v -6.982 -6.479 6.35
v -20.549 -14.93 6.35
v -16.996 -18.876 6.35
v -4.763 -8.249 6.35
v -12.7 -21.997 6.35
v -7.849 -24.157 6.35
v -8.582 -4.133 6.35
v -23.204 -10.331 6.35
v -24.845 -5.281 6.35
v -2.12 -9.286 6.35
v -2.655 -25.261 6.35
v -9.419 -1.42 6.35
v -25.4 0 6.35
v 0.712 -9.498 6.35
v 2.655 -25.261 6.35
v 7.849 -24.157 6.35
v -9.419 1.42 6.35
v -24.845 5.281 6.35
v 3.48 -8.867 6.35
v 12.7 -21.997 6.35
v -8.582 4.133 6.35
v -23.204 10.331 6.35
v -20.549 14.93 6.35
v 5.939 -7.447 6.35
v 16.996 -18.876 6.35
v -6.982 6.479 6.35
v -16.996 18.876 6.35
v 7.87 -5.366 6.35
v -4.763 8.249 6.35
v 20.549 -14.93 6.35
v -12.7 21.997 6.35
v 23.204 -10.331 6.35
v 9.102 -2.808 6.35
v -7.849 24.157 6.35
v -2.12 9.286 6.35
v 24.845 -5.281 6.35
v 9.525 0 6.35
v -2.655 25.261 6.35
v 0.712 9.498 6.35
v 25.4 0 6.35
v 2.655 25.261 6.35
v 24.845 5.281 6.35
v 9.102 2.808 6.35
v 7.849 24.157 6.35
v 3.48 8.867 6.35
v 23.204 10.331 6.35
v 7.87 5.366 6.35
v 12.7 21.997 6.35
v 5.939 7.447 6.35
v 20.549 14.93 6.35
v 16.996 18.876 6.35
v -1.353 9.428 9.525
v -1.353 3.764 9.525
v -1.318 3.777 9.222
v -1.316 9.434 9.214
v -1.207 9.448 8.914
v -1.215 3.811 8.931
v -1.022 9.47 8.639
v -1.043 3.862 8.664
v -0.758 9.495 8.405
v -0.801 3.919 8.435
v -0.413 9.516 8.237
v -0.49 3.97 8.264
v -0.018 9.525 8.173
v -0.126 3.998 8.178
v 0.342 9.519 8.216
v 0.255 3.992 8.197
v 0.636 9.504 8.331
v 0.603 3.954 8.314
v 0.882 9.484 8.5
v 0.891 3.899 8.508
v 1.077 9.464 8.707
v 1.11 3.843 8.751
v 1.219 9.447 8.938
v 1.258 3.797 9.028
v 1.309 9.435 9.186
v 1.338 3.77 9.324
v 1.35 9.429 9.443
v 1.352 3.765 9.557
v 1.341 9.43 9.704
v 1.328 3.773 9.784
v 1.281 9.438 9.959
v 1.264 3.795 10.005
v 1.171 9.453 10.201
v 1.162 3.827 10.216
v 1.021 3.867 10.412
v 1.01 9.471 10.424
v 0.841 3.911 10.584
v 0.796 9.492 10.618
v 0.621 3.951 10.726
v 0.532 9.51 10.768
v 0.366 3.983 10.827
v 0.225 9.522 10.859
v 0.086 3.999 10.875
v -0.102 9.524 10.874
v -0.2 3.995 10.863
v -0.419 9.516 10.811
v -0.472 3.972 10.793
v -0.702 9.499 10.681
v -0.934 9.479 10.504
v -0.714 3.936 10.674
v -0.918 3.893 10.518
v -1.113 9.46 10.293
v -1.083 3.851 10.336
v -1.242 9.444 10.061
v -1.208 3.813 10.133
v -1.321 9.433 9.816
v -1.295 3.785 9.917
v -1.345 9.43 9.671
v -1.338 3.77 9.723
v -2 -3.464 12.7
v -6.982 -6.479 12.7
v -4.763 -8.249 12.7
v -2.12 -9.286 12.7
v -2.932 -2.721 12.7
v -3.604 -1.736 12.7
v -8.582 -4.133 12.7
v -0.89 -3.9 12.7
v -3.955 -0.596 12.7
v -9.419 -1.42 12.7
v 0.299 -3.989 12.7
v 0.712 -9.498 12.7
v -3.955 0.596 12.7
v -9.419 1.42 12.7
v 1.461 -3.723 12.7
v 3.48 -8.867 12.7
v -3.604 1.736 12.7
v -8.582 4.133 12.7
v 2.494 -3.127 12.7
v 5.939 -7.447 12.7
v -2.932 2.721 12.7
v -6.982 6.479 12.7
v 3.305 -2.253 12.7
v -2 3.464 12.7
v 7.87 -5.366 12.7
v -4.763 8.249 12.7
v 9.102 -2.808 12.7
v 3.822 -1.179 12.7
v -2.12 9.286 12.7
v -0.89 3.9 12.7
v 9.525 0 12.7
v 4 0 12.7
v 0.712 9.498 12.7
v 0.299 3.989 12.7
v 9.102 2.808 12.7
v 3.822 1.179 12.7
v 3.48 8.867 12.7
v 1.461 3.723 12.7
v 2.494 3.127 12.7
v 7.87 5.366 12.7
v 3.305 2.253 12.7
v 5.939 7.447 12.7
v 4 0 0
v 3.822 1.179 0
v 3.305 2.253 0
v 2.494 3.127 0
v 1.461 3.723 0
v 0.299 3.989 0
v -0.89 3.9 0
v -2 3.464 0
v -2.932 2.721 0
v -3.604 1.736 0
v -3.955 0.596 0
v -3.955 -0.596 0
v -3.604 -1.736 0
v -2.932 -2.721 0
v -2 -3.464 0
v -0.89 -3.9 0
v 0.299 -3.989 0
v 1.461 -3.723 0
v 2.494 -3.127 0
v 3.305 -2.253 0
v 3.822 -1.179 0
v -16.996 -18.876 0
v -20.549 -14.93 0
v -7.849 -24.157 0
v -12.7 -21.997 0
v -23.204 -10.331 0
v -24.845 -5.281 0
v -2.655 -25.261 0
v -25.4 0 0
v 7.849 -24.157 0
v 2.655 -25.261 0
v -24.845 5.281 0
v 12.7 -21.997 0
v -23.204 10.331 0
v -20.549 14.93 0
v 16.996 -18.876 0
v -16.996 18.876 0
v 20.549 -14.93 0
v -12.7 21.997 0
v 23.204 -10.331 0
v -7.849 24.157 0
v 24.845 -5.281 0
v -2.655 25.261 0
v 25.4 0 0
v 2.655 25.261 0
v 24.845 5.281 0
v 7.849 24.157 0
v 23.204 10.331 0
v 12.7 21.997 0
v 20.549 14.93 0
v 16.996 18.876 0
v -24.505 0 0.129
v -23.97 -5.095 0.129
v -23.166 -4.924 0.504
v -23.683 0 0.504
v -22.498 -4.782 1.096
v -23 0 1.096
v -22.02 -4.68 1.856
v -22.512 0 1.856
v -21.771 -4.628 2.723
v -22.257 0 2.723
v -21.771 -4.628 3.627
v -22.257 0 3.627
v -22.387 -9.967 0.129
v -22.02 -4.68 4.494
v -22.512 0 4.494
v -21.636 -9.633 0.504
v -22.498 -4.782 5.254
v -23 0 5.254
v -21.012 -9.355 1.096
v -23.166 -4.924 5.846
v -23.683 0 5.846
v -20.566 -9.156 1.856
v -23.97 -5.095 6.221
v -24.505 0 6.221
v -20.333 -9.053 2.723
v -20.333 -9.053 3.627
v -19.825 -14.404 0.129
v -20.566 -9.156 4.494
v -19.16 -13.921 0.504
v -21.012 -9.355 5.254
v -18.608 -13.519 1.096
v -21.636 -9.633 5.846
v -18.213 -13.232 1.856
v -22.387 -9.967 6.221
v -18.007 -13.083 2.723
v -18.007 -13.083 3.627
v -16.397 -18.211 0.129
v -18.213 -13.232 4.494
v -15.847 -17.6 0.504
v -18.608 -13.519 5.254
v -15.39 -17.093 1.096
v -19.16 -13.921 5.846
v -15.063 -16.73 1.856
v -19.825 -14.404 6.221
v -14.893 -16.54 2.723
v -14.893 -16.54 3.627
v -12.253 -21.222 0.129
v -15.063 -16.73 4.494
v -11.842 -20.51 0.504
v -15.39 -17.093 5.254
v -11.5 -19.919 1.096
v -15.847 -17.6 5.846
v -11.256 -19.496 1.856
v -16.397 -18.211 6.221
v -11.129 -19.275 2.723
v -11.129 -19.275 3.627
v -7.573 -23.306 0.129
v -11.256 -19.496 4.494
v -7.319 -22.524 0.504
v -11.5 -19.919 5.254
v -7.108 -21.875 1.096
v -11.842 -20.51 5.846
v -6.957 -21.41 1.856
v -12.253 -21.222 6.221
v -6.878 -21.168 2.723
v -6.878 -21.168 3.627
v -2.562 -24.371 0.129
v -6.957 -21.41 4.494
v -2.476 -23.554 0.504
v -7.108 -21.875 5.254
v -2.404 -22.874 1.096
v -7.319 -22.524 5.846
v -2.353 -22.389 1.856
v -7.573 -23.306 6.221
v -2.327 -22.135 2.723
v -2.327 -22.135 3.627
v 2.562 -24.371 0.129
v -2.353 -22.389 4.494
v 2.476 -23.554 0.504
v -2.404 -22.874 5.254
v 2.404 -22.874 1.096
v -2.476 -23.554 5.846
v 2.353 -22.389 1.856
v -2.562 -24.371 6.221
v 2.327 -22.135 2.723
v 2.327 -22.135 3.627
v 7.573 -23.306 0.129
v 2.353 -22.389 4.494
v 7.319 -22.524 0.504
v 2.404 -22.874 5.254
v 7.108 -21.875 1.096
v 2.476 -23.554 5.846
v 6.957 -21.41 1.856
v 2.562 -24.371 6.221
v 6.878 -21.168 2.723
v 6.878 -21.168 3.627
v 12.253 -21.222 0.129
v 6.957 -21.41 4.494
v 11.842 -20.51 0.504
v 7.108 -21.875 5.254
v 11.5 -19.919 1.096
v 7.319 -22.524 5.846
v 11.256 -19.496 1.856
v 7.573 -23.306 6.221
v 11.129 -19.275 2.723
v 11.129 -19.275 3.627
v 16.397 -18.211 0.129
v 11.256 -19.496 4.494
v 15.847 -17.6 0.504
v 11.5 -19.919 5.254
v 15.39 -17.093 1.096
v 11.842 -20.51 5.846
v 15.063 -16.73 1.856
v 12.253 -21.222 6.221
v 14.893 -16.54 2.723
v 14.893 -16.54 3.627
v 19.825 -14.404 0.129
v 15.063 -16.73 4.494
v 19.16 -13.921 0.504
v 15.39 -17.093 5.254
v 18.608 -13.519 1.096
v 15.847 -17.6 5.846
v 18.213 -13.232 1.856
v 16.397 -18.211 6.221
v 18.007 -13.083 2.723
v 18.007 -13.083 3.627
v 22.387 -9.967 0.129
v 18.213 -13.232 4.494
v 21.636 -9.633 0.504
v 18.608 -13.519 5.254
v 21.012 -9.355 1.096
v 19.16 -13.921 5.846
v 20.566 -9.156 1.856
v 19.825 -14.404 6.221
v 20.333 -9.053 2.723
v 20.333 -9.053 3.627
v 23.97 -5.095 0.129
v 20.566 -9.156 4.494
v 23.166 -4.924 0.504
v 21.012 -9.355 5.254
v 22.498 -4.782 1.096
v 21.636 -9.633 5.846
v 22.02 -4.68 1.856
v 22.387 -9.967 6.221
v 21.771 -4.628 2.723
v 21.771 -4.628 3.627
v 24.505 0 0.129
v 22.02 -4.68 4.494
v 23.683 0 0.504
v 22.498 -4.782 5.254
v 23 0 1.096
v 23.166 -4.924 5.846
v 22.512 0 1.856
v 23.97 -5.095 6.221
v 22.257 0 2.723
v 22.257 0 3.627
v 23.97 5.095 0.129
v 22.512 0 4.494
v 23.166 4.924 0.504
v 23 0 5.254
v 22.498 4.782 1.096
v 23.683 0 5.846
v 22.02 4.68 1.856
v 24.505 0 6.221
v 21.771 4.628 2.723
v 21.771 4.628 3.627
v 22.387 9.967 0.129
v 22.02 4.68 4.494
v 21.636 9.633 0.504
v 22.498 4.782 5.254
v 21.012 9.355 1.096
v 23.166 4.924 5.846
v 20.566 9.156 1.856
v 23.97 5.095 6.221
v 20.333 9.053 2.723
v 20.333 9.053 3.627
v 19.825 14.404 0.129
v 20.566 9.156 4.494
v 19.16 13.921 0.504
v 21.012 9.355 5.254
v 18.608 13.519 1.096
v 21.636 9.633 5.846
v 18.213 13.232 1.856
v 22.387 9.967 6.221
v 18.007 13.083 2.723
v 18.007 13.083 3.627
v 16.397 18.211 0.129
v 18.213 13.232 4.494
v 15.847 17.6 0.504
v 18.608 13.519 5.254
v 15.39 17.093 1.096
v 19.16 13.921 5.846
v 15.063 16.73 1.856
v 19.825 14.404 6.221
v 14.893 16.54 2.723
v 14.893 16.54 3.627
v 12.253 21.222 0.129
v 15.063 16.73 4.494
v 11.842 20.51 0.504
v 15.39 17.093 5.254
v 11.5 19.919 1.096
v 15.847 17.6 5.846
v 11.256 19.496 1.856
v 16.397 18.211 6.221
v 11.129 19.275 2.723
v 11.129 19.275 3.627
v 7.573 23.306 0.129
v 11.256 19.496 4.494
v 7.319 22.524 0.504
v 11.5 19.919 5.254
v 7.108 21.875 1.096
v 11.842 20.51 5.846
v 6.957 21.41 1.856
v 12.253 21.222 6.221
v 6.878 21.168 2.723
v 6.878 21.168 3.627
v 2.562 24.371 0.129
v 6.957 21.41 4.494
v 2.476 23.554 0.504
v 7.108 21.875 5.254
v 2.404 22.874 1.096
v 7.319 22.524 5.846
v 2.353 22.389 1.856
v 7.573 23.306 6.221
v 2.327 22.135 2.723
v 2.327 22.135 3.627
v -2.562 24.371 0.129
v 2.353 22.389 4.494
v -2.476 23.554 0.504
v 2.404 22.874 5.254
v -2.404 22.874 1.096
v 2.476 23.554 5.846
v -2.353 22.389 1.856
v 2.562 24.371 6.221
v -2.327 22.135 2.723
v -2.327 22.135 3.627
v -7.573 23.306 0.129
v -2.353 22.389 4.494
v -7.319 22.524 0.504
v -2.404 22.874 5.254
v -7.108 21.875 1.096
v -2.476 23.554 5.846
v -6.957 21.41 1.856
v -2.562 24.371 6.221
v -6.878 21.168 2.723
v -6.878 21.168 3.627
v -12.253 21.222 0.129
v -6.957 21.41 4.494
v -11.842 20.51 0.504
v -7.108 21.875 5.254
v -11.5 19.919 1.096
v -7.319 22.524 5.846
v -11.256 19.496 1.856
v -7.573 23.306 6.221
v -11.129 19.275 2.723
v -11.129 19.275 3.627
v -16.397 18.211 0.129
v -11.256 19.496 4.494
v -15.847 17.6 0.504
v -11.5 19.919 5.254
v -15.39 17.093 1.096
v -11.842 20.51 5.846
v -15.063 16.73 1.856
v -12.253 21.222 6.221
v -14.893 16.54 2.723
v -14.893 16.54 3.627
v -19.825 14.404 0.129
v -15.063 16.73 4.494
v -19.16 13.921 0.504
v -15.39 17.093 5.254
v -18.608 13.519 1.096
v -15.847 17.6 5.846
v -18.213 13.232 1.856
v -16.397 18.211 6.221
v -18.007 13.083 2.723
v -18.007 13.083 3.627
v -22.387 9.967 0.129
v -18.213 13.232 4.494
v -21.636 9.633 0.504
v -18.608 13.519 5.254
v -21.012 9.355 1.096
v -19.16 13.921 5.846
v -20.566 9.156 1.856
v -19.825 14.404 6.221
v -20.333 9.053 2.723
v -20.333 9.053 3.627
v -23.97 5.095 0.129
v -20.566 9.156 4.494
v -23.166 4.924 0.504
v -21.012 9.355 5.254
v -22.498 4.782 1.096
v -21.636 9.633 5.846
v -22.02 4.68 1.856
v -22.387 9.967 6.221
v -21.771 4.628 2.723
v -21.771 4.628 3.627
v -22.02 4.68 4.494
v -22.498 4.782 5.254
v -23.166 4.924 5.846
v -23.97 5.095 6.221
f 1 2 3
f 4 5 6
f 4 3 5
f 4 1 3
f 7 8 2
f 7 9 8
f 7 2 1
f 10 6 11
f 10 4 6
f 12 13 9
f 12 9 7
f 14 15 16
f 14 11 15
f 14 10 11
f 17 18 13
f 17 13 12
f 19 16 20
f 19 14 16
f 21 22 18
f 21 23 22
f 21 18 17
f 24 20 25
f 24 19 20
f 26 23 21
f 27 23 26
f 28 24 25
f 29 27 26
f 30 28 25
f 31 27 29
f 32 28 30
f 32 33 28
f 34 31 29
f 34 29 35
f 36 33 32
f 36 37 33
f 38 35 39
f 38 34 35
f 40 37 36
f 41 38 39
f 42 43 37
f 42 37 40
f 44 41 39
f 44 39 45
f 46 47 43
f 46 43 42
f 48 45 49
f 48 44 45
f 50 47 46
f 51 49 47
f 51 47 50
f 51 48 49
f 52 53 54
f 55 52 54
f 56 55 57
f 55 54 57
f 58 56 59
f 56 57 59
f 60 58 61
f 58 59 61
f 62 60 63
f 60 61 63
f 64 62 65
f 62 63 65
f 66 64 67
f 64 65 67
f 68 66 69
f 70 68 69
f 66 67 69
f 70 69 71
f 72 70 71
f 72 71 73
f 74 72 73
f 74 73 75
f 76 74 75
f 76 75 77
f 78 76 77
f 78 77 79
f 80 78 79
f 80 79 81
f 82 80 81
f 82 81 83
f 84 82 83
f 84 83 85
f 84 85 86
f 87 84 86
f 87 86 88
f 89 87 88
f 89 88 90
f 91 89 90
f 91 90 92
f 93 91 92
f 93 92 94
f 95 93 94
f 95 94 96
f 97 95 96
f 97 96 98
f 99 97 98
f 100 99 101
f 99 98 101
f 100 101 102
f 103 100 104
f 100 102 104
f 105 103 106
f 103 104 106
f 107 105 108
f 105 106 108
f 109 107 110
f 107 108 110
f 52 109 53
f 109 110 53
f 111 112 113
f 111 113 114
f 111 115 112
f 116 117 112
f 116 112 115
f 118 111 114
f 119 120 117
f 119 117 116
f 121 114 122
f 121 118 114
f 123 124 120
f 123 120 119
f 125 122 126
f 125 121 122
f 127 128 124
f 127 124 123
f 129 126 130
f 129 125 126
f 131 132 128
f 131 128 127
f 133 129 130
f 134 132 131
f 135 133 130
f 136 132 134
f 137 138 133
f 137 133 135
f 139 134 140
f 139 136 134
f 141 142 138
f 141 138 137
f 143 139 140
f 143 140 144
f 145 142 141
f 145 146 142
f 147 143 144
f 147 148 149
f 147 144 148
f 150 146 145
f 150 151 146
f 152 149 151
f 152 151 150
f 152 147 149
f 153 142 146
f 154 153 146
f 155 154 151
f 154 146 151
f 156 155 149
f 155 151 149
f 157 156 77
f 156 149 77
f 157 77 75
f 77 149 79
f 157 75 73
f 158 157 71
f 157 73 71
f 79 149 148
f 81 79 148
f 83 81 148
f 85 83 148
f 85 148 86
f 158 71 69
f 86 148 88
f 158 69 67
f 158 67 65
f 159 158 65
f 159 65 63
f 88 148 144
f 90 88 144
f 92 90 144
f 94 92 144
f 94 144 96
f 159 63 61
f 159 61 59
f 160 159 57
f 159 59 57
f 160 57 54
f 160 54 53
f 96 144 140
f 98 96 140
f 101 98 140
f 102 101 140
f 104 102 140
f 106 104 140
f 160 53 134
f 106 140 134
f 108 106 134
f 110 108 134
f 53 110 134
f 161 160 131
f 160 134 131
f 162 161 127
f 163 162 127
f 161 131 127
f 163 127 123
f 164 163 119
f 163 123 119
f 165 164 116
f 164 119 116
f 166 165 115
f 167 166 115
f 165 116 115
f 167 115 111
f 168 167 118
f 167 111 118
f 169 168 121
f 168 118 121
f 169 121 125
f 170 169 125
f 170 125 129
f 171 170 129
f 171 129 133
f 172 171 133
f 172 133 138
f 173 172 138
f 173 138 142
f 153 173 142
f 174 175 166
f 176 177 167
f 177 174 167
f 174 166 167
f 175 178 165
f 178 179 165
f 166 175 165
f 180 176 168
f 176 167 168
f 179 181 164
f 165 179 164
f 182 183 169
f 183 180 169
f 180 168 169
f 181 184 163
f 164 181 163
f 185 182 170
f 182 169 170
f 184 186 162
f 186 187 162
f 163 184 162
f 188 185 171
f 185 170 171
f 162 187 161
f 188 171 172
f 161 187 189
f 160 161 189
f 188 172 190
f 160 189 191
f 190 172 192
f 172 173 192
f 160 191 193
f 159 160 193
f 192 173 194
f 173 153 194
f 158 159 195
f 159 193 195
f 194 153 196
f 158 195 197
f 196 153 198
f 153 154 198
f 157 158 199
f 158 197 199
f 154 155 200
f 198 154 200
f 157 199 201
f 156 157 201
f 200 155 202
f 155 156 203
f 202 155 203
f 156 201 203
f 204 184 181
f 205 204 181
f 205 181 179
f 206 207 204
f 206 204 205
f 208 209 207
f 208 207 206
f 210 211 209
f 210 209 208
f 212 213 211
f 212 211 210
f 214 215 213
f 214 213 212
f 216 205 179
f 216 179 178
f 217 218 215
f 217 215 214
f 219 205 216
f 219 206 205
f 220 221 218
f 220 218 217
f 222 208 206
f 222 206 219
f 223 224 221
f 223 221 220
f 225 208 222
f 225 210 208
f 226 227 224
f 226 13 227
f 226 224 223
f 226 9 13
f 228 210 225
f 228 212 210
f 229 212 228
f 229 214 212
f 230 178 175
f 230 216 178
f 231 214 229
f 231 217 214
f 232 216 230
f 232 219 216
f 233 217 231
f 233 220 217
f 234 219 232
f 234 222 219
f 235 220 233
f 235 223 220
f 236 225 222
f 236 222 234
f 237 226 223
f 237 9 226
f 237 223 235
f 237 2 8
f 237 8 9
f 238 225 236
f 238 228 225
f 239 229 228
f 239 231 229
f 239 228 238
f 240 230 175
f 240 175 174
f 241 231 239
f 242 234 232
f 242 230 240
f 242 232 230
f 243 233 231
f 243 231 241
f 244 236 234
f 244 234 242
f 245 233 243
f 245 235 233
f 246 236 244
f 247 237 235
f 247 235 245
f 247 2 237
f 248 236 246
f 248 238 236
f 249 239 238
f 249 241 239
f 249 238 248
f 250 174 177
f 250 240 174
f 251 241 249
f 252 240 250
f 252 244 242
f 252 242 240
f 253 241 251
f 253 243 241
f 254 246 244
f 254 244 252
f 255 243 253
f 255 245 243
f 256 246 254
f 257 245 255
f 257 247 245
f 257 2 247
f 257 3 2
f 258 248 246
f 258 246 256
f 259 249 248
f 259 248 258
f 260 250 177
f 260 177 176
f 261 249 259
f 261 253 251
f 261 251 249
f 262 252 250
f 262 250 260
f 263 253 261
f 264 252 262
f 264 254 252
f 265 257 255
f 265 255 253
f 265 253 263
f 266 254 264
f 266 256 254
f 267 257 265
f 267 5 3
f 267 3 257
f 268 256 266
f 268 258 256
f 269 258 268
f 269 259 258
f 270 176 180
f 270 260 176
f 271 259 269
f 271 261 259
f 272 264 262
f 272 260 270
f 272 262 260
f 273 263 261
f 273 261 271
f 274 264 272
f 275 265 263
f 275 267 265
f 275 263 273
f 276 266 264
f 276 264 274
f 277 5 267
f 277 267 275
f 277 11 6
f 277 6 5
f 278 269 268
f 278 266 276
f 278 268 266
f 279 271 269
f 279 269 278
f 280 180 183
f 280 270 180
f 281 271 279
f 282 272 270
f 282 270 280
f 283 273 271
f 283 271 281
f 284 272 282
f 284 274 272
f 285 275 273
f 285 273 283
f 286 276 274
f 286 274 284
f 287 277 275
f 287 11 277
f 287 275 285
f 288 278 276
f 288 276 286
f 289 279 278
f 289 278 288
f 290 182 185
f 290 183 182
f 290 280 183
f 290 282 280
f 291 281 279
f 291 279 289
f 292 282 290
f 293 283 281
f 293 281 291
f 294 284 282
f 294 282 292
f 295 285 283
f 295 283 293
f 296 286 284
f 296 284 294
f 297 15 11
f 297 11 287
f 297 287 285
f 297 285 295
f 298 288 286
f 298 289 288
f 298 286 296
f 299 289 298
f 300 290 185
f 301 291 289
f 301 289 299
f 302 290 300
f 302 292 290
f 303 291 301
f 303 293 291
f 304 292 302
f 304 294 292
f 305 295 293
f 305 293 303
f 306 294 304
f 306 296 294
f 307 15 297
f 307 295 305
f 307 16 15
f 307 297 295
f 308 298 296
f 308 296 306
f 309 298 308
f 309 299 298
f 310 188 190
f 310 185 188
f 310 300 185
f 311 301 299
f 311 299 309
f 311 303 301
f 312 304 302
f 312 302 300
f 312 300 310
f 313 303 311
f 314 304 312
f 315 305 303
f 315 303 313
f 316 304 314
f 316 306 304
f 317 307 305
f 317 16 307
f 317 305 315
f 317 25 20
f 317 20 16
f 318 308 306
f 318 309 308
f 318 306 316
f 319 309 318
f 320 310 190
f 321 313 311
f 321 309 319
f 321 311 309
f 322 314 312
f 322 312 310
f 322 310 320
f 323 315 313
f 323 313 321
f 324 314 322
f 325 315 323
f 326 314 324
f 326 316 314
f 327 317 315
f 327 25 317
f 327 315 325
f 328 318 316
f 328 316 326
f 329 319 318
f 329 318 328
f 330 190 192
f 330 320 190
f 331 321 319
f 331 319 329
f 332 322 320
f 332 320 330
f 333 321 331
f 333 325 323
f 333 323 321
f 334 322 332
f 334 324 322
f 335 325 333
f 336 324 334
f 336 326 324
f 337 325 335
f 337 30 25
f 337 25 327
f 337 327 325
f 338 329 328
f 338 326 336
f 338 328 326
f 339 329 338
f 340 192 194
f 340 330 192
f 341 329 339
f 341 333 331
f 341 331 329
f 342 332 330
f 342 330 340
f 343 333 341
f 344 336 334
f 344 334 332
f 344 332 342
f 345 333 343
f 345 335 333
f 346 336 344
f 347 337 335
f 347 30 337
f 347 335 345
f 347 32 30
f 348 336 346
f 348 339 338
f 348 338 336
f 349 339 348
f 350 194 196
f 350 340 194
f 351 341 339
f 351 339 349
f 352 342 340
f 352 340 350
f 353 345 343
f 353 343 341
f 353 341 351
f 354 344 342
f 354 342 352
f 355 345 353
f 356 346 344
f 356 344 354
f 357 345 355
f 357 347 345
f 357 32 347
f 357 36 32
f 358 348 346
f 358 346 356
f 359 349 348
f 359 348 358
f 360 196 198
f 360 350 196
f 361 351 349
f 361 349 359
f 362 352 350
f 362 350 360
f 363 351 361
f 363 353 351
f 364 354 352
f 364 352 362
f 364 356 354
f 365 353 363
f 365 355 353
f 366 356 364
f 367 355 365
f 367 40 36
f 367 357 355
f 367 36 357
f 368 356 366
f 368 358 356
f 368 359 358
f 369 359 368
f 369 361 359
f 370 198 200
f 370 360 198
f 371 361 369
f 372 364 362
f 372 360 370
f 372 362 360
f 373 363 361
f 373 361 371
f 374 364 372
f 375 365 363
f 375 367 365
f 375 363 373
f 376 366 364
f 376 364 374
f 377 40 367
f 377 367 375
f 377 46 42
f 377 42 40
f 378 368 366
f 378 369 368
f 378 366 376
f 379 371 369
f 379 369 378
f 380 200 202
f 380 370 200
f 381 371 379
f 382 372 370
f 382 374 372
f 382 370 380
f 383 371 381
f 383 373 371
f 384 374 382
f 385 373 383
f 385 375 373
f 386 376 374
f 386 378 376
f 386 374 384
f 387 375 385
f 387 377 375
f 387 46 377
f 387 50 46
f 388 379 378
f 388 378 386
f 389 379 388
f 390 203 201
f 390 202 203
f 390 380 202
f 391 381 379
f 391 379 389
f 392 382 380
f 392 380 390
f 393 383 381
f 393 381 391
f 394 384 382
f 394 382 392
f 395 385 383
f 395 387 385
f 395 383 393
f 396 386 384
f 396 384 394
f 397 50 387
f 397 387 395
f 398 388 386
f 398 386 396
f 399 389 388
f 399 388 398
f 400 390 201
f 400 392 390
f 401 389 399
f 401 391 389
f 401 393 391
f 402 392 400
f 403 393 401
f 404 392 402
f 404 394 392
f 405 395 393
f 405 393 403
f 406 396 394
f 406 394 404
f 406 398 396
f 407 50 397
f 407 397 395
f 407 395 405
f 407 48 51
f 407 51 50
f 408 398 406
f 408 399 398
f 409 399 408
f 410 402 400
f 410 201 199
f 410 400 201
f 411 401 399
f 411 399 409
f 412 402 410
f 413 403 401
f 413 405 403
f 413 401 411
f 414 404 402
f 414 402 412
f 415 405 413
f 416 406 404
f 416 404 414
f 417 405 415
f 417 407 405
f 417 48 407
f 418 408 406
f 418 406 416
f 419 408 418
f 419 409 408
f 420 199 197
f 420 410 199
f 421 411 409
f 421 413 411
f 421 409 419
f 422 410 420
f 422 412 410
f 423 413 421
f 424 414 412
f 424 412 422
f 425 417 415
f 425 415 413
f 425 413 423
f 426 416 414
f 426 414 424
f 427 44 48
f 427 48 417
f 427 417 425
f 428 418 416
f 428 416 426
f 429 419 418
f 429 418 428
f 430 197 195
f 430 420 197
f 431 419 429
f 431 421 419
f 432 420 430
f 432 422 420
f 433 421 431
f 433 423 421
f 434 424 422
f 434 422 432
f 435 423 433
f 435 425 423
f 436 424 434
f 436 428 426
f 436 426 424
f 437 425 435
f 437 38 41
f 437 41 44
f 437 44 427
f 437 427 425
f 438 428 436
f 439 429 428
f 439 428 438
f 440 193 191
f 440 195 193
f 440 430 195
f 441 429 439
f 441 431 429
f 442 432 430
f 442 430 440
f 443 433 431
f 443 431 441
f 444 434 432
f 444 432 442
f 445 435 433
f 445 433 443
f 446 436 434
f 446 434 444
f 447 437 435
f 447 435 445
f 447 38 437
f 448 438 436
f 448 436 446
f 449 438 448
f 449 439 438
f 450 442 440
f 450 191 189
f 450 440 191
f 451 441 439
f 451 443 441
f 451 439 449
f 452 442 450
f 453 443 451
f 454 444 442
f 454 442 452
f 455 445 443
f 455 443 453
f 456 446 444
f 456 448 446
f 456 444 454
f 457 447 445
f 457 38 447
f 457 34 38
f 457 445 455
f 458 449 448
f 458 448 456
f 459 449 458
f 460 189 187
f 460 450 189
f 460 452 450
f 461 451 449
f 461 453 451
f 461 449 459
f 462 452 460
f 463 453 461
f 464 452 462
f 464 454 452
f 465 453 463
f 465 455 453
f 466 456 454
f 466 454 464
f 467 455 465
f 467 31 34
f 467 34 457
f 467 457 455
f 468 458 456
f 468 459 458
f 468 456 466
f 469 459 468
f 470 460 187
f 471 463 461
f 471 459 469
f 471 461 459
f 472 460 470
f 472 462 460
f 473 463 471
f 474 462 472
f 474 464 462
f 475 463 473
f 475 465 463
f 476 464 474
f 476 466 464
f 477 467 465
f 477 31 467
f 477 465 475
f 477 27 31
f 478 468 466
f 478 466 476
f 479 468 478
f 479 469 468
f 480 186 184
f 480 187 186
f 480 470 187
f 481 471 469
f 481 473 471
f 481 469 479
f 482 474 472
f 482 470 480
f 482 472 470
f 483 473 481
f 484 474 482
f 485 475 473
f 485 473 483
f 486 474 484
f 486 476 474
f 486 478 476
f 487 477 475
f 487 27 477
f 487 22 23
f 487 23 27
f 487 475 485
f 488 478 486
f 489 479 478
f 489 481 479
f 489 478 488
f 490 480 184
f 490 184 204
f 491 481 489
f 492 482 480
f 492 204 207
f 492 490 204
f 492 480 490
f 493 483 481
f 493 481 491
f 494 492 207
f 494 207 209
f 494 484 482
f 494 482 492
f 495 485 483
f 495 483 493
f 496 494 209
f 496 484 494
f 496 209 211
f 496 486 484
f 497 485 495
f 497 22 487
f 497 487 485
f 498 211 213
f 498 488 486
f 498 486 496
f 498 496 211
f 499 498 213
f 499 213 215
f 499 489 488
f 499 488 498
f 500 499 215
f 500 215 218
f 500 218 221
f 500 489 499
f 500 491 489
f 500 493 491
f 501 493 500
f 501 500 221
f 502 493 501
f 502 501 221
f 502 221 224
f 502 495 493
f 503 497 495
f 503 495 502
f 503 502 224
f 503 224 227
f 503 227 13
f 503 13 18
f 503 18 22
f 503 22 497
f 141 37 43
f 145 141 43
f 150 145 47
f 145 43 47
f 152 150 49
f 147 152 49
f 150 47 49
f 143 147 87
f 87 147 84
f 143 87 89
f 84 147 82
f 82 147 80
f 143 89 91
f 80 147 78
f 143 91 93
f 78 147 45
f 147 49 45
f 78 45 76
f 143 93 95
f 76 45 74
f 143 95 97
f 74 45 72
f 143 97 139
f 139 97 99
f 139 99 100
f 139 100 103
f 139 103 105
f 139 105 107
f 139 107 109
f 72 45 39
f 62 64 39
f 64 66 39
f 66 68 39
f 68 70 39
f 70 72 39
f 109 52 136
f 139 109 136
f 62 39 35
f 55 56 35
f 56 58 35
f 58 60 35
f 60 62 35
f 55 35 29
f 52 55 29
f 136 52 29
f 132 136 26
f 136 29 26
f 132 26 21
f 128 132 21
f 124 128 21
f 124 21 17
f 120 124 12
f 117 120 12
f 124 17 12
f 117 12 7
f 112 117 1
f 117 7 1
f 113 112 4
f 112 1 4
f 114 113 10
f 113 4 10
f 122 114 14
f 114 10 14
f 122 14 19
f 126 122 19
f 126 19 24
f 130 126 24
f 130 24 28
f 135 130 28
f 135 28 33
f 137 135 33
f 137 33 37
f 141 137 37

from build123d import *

# Parameters (mm, degrees)
SKETCH1_R                 = 25.4
BOSS_EXTRUDE1_DEPTH       = 6.35
SKETCH2_R                 = 9.525
BOSS_EXTRUDE2_DEPTH       = 6.35
SKETCH3_R                 = 4
CUT_EXTRUDE1_DEPTH        = 12.7
F_6_32_TAPPED_HOLE1_D     = 2.7051
F_6_32_TAPPED_HOLE1_DEPTH = 9.524
F_6_32_TAPPED_HOLE1_TIP   = 0.81269403


with BuildPart() as part:
    # Sketch1 → Boss-Extrude1 (new body)
    with BuildSketch(Plane.XY):
        Circle(SKETCH1_R)
    extrude(amount=BOSS_EXTRUDE1_DEPTH)

    # Sketch2 → Boss-Extrude2 (add)
    with BuildSketch(Plane.XY.offset(6.35)):
        Circle(SKETCH2_R)
    extrude(amount=BOSS_EXTRUDE2_DEPTH)

    # Sketch3 → Cut-Extrude1 (cut)
    with BuildSketch(Plane.XY.offset(12.7)):
        Circle(SKETCH3_R)
    extrude(amount=-CUT_EXTRUDE1_DEPTH, mode=Mode.SUBTRACT)

    # Sketch4 → Cut-Revolve1 (revolve, cut)
    with BuildSketch(Plane(origin=(0, 0, 0), x_dir=(1, 0, 0), z_dir=(0, 1, 0)), mode=Mode.PRIVATE) as cut_revolve1_sk:
        with BuildLine():
            Line((25.4, -6.35), (25.4, 0))
            ThreePointArc((25.4, 0), (22.225, -3.175), (25.4, -6.35))
        make_face()
    revolve(cut_revolve1_sk.sketch.rotate(Axis((0, 0, -6.424339231), (0, 0, 1)), 180), axis=Axis((0, 0, -6.424339231), (0, 0, 1)), mode=Mode.SUBTRACT)

    # #6-32 Tapped Hole1
    with Locations(Plane(origin=(0, 9.525, 9.525), x_dir=(1, 0, 0), z_dir=(0, 1, 0))):
        with Locations((0, 0)):
            Hole(F_6_32_TAPPED_HOLE1_D / 2, depth=F_6_32_TAPPED_HOLE1_DEPTH)
            with Locations((0, 0, -(F_6_32_TAPPED_HOLE1_DEPTH + F_6_32_TAPPED_HOLE1_TIP / 2))):  # 118° drill point
                Cone(0, F_6_32_TAPPED_HOLE1_D / 2, F_6_32_TAPPED_HOLE1_TIP, mode=Mode.SUBTRACT)


solid = part.part
